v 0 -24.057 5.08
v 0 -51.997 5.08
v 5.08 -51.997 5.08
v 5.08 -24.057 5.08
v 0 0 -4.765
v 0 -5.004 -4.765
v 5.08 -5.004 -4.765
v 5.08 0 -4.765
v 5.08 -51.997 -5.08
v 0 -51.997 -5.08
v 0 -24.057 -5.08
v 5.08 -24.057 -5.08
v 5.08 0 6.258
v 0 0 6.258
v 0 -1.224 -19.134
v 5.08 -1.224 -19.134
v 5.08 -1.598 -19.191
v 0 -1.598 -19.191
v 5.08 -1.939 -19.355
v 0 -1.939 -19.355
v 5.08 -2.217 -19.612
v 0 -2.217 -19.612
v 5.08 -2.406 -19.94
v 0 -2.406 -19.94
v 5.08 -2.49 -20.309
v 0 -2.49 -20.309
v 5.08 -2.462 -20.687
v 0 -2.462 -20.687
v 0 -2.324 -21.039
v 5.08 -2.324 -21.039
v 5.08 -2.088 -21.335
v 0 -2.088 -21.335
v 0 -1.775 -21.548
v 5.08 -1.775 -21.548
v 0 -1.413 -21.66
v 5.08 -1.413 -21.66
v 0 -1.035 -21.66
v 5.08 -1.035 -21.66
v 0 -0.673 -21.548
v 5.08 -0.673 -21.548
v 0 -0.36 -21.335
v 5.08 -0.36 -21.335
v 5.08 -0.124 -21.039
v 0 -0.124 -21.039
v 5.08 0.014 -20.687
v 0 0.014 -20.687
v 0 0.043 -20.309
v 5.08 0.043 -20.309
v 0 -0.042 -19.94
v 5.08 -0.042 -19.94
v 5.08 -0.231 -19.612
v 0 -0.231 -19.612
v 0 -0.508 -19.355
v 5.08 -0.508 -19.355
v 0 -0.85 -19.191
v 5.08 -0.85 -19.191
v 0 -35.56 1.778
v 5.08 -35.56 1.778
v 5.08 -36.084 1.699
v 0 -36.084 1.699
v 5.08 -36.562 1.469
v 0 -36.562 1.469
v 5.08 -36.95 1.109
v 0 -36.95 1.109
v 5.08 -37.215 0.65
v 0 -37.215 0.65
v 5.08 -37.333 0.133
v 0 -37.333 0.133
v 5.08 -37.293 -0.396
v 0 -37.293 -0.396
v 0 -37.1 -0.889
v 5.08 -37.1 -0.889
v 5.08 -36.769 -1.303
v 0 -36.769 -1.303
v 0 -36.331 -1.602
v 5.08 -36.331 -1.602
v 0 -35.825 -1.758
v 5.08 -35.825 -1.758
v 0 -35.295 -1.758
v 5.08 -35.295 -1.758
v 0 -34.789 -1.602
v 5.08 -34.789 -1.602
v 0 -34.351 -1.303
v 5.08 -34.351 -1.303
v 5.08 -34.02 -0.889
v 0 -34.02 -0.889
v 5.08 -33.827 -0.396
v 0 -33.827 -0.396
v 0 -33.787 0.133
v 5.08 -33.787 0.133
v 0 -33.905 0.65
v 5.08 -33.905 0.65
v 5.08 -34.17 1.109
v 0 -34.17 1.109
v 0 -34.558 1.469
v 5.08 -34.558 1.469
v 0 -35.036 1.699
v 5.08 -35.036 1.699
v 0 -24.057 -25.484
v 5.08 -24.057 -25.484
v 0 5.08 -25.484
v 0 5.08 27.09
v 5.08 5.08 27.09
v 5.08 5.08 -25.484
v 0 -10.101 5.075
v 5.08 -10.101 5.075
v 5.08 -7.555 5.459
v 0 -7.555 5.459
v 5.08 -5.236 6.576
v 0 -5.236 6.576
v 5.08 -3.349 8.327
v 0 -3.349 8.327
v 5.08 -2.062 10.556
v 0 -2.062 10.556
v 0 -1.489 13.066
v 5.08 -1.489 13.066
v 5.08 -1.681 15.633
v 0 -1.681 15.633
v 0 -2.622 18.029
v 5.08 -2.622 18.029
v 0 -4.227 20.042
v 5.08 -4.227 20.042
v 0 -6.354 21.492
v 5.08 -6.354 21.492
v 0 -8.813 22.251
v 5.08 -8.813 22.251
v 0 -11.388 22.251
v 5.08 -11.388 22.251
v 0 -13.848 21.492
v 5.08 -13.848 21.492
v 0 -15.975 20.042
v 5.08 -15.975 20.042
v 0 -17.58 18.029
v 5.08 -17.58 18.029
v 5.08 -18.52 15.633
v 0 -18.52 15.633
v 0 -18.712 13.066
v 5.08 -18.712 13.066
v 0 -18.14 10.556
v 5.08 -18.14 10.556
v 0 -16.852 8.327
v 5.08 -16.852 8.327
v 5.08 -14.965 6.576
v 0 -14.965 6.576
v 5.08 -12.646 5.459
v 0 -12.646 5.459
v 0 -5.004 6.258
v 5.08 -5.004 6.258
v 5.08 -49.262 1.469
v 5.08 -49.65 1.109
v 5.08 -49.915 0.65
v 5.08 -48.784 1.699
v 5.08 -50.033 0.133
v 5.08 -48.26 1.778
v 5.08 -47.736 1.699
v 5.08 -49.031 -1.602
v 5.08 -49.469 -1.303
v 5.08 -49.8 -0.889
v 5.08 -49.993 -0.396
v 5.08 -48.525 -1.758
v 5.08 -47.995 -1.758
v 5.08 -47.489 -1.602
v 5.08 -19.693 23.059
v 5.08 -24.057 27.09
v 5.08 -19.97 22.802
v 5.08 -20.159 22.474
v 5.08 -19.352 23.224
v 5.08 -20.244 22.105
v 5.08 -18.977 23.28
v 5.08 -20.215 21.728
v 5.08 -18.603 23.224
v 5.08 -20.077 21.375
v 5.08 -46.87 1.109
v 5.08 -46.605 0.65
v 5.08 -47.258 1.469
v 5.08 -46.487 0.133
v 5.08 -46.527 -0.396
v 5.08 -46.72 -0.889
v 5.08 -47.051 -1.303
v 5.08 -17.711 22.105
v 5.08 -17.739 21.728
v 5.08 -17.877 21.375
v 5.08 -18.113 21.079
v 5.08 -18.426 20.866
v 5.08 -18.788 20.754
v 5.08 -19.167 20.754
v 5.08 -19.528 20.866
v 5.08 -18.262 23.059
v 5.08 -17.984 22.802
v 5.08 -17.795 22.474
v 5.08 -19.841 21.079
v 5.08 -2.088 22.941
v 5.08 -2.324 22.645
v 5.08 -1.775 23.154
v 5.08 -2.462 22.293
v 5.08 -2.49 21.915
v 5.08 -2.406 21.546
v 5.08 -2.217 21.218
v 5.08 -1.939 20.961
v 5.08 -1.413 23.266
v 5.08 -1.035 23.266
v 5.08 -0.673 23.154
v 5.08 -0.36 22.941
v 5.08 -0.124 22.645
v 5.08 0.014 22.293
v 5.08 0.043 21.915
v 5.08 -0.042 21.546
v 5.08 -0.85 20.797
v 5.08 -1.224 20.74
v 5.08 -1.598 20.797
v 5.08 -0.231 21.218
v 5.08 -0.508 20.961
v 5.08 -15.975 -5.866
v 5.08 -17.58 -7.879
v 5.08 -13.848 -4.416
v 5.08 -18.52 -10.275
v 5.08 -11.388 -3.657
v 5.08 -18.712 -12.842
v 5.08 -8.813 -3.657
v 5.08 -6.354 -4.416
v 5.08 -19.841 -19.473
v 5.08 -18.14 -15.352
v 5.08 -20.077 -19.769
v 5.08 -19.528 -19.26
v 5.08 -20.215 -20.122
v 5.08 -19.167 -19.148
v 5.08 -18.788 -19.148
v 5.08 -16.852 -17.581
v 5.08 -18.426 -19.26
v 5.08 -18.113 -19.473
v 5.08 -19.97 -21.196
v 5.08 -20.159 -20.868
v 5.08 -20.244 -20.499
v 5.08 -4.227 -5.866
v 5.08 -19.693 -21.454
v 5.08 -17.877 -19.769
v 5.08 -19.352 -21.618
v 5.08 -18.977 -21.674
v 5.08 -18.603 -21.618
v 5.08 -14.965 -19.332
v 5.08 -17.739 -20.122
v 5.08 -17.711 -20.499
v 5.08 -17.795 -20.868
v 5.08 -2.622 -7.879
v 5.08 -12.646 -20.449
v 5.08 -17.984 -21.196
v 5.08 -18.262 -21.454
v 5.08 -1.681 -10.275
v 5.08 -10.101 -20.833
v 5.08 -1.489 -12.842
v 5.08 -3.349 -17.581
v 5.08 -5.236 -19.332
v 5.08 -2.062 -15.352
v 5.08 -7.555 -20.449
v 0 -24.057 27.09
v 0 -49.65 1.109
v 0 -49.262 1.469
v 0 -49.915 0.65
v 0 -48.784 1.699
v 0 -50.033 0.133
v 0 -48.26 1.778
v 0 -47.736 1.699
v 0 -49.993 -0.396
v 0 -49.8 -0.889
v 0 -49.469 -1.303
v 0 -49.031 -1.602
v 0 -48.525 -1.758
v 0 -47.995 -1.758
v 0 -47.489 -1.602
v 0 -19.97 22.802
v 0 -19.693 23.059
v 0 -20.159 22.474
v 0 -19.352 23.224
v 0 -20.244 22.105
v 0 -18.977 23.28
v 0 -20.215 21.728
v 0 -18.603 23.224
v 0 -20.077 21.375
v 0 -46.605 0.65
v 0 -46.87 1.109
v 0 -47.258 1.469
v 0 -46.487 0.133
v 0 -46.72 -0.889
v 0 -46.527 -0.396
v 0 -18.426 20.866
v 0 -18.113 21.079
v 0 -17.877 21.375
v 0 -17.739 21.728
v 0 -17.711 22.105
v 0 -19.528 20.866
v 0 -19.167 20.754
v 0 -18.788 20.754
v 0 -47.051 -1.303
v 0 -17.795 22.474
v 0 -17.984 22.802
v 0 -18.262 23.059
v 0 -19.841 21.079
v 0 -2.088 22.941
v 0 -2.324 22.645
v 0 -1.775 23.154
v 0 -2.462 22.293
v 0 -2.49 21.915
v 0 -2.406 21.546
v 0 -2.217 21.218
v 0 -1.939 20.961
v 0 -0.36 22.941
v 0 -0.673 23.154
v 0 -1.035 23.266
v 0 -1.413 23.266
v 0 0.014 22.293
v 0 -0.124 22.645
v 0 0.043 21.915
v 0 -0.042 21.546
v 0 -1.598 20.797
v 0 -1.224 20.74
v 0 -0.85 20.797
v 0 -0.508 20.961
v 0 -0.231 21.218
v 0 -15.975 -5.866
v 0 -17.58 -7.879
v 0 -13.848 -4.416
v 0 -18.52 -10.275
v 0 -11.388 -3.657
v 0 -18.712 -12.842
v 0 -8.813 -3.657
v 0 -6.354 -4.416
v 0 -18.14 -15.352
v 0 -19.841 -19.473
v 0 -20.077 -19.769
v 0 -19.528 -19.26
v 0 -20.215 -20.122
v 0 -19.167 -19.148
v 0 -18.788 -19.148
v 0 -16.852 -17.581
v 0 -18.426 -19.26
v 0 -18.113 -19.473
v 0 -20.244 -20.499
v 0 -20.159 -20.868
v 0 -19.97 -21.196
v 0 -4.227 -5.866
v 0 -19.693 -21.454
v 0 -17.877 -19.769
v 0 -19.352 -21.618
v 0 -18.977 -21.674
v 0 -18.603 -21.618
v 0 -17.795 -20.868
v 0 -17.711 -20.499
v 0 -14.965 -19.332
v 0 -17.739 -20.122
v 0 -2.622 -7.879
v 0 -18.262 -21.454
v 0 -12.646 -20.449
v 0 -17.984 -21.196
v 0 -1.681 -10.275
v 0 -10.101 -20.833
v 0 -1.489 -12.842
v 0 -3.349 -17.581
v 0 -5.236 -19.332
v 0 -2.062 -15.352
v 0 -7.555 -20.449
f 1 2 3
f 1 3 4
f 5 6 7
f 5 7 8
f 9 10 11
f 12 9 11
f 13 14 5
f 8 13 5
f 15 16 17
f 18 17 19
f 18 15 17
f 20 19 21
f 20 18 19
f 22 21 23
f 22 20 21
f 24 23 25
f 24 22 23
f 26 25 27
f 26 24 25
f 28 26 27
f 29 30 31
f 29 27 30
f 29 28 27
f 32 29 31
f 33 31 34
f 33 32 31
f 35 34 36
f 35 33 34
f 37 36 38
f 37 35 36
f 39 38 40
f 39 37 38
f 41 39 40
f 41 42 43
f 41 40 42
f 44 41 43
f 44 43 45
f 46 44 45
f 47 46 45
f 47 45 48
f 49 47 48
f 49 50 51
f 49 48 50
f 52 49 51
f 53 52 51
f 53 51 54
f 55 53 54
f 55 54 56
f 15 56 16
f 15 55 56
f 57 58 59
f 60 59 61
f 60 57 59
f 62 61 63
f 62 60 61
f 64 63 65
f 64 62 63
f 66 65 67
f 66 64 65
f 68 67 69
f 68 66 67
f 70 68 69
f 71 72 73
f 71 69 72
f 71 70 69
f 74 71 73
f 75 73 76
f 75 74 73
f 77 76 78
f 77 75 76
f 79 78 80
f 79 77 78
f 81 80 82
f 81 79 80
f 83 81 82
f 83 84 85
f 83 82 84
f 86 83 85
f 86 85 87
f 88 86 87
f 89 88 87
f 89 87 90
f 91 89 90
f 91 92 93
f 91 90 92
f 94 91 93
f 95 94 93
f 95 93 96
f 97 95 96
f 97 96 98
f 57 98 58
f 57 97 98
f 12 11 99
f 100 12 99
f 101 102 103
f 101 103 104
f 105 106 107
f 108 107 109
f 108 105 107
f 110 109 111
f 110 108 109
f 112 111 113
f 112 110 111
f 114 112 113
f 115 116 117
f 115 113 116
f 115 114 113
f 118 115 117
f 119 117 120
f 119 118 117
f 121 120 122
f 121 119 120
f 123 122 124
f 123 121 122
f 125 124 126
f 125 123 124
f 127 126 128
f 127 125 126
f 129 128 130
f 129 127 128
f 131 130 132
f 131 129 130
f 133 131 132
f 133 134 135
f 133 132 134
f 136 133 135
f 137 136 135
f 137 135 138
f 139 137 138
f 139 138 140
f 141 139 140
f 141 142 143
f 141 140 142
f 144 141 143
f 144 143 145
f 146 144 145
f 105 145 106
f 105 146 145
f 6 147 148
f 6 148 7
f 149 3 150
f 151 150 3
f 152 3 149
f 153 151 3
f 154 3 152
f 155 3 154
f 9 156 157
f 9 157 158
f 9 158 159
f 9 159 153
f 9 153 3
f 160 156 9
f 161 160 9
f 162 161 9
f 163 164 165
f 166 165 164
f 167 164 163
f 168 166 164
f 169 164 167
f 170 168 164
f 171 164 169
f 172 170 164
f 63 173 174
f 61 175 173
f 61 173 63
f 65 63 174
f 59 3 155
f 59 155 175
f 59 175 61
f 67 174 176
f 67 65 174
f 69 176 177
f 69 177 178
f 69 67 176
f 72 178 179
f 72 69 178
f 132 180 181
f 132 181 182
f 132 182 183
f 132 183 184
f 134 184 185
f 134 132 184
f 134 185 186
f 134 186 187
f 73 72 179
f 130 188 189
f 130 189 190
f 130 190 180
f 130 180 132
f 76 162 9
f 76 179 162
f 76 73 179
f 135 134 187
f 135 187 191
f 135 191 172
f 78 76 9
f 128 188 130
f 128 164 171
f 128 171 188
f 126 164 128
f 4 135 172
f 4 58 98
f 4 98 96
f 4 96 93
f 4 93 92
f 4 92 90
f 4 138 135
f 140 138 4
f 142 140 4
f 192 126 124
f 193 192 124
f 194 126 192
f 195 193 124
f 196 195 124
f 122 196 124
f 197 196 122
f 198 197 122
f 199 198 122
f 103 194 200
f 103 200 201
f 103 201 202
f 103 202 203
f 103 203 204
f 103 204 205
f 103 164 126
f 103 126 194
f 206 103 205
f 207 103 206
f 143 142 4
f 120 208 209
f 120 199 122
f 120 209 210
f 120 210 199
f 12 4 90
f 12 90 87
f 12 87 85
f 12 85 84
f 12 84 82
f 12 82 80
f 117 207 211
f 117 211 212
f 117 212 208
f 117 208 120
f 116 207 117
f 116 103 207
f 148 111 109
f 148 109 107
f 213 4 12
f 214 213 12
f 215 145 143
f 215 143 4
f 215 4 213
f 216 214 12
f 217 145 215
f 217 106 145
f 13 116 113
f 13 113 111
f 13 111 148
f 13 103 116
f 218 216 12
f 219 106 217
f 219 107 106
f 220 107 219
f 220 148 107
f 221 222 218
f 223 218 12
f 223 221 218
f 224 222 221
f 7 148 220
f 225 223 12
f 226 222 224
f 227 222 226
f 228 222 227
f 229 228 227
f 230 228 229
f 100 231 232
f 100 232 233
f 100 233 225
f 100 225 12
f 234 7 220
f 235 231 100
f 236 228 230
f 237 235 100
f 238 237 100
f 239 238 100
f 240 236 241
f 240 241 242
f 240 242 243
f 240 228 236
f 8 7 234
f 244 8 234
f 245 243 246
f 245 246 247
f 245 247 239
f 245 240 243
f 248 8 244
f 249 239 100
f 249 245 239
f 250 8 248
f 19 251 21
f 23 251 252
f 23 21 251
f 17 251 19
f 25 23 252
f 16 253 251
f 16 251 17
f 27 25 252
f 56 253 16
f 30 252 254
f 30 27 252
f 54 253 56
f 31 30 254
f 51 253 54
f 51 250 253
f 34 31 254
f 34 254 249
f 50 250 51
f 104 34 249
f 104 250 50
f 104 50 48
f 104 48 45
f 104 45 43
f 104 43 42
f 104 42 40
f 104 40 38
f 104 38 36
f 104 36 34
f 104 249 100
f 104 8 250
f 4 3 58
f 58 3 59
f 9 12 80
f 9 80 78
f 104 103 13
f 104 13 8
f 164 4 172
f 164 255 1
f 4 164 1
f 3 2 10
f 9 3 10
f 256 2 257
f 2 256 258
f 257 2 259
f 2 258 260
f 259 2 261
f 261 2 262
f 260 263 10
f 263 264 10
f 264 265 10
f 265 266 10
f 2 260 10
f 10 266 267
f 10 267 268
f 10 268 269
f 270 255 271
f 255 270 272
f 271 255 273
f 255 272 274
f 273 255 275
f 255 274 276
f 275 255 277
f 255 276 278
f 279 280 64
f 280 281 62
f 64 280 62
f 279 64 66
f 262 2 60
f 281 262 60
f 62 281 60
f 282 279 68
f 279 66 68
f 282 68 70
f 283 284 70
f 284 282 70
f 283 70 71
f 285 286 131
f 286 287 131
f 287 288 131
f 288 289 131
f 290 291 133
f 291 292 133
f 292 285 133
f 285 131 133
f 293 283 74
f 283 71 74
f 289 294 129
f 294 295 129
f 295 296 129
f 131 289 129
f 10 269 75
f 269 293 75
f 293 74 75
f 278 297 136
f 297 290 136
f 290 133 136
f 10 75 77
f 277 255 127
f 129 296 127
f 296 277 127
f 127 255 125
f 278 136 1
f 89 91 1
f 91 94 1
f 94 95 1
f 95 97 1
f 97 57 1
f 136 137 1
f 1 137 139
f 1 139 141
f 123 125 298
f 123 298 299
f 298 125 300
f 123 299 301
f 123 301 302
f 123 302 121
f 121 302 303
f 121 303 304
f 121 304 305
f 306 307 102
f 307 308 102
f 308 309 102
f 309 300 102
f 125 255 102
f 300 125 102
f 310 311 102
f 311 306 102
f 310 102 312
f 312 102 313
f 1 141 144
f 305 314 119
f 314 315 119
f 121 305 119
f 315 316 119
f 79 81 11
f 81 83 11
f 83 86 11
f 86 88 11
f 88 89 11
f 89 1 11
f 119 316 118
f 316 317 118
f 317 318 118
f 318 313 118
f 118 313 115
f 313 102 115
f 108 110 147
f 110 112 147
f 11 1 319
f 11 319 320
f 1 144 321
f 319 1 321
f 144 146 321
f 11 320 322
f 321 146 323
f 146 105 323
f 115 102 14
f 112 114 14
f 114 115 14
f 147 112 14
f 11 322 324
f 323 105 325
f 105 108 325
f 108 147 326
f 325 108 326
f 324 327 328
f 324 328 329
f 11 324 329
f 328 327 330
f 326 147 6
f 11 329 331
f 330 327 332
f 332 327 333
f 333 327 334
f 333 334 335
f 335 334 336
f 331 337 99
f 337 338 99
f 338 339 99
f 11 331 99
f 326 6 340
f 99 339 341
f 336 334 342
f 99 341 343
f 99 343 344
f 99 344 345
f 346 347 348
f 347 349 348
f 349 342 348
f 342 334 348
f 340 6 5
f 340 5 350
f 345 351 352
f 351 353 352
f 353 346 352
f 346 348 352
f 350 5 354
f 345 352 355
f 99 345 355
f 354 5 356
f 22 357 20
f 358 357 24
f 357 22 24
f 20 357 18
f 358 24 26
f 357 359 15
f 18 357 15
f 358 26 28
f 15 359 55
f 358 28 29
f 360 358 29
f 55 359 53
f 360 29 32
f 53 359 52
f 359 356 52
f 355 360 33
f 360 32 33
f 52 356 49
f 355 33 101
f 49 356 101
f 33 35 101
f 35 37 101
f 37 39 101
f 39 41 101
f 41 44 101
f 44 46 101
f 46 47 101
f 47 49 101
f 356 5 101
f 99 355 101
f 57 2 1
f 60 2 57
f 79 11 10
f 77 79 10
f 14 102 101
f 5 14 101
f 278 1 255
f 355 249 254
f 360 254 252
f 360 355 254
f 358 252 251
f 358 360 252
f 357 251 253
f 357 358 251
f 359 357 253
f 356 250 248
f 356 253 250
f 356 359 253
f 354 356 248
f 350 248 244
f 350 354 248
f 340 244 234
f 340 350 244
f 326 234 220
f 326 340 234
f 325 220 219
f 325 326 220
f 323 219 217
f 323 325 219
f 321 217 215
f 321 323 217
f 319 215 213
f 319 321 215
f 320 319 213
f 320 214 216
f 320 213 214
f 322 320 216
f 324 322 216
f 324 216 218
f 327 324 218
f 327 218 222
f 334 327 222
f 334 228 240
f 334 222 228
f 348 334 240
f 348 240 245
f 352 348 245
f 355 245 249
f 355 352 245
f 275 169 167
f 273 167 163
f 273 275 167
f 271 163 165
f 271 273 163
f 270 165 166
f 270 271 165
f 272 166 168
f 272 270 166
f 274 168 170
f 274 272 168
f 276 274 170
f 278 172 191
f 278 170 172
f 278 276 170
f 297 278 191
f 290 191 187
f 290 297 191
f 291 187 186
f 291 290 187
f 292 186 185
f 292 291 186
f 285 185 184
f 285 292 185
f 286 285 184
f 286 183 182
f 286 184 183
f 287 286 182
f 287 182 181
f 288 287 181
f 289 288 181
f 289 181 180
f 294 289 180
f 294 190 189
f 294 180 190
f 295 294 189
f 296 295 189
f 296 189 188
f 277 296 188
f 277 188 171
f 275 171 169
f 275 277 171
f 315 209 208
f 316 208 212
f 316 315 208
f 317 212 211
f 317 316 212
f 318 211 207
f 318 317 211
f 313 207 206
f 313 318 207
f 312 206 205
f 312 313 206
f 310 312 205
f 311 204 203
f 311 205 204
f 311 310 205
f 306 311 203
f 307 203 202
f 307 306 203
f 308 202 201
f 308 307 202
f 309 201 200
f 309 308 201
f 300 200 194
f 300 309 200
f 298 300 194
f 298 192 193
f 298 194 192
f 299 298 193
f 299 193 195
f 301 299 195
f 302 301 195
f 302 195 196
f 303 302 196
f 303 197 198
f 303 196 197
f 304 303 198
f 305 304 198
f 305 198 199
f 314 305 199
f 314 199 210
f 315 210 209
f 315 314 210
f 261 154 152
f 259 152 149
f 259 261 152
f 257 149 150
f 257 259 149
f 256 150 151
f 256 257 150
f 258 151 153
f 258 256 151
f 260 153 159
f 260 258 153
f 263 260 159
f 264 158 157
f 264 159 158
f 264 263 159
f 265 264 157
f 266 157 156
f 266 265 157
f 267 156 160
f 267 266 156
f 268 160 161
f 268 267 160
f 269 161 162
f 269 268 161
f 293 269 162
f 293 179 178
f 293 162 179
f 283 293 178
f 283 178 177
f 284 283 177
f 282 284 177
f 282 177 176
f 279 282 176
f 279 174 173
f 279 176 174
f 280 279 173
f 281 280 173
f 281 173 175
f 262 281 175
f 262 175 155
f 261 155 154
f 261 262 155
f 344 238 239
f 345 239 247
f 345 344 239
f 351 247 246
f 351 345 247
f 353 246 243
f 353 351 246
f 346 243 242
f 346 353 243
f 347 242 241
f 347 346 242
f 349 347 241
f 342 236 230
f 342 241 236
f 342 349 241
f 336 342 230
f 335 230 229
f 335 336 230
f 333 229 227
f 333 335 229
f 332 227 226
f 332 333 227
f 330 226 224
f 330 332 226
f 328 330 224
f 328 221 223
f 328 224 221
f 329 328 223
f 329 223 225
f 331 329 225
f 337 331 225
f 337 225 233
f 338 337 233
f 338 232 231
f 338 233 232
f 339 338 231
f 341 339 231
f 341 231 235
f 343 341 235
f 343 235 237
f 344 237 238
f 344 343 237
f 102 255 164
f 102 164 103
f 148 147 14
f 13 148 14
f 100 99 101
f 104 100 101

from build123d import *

# Parameters (mm, degrees)
BOSS_EXTRUDE1_DEPTH = 5.08
SKETCH2_W           = 101.6
SKETCH2_H           = 10.16
CUT_EXTRUDE3_DEPTH  = 22.86
SKETCH9_R           = 1.27
CUT_EXTRUDE4_DEPTH  = 25.908
SKETCH13_W          = 11.0236
SKETCH13_H          = 5.0038
CUT_EXTRUDE5_DEPTH  = 25.908
SKETCH8_R           = 8.636
CUT_EXTRUDE6_DEPTH  = 25.908
SKETCH14_W          = 212.203069611
SKETCH14_H          = 122.52066239
SKETCH14_W_2        = 52.5744
SKETCH14_H_2        = 29.137232508
CUT_EXTRUDE7_DEPTH  = 25.908
SKETCH15_W          = 52.5744
SKETCH15_H          = 43.722211583
BOSS_EXTRUDE2_DEPTH = 5.08
SKETCH17_W          = 25.579382718
SKETCH17_H          = 36.902767492
CUT_EXTRUDE8_DEPTH  = 10.16
SKETCH18_R          = 1.7526
CUT_EXTRUDE9_DEPTH  = 10.16
SKETCH19_W          = 77.987144431
SKETCH19_H          = 16.36926668
CUT_EXTRUDE10_DEPTH = 19.05
SKETCH20_R          = 1.778
CUT_EXTRUDE11_DEPTH = 19.05


with BuildPart() as part:
    # Sketch1 → Boss-Extrude1 (new body)
    with BuildSketch(Plane(origin=(0, 0, 0), x_dir=(0, 0, -1), z_dir=(1, 0, 0))):
        Polygon((62.997029703, -55.82970297), (88.397029703, -55.82970297), (88.397029703, -65.98970297), (-89.402970297, -65.98970297), (-89.402970297, -55.82970297), (-64.002970297, -55.82970297), (-64.002970297, 27.837475742), (62.997029703, 27.837475742), align=None)
    extrude(amount=BOSS_EXTRUDE1_DEPTH)

    # Sketch2 → Cut-Extrude3 (cut)
    with BuildSketch(Plane(origin=(0, 0, 0), x_dir=(0, 0, -1), z_dir=(1, 0, 0))):
        with Locations((-0.502970297, -60.90970297)):
            Rectangle(SKETCH2_W, SKETCH2_H)
    extrude(amount=CUT_EXTRUDE3_DEPTH, mode=Mode.SUBTRACT)

    # Sketch9 → Cut-Extrude4 (cut)
    with BuildSketch(Plane(origin=(0, 0, 0), x_dir=(0, 0, -1), z_dir=(1, 0, 0))):
        with Locations((-22.010170297, -1.223907747)):
            Circle(SKETCH9_R)
        with Locations(Location((-22.010170297, -18.977232508, 0), (0, 0, 180))):
            Circle(SKETCH9_R)
        with Locations((20.404229703, -18.977232508)):
            Circle(SKETCH9_R)
        with Locations(Location((20.404229703, -1.223907747, 0), (0, 0, 180))):
            Circle(SKETCH9_R)
    extrude(amount=CUT_EXTRUDE4_DEPTH, mode=Mode.SUBTRACT)

    # Sketch13 → Cut-Extrude5 (cut)
    with BuildSketch(Plane(origin=(0, 0, 0), x_dir=(0, 0, -1), z_dir=(1, 0, 0))):
        with Locations((-0.746414126, -2.5019)):
            Rectangle(SKETCH13_W, SKETCH13_H)
    extrude(amount=CUT_EXTRUDE5_DEPTH, mode=Mode.SUBTRACT)

    # Sketch8 → Cut-Extrude6 (cut)
    with BuildSketch(Plane(origin=(0, 0, 0), x_dir=(0, 0, -1), z_dir=(1, 0, 0))):
        with Locations((12.197029703, -10.100570128)):
            Circle(SKETCH8_R)
        with Locations((-13.710970297, -10.100570128)):
            Circle(SKETCH8_R)
    extrude(amount=CUT_EXTRUDE6_DEPTH, mode=Mode.SUBTRACT)

    # Sketch14 → Cut-Extrude7 (cut)
    with BuildSketch(Plane(origin=(0, 0, 0), x_dir=(0, 0, -1), z_dir=(1, 0, 0))):
        with Locations((-5.581398167, -16.698007888)):
            Rectangle(SKETCH14_W, SKETCH14_H)
        with Locations((-0.802970297, -9.488616254)):
            Rectangle(SKETCH14_W_2, SKETCH14_H_2, mode=Mode.SUBTRACT)
    extrude(amount=CUT_EXTRUDE7_DEPTH, mode=Mode.SUBTRACT)

    # Sketch15 → Boss-Extrude2 (add)
    with BuildSketch(Plane(origin=(0, 0, 0), x_dir=(0, 0, -1), z_dir=(1, 0, 0))):
        with Locations((-0.802970297, -44.178894209)):
            Rectangle(SKETCH15_W, SKETCH15_H)
    extrude(amount=BOSS_EXTRUDE2_DEPTH)

    # Sketch17 → Cut-Extrude8 (cut)
    with BuildSketch(Plane(origin=(0, 0, 0), x_dir=(0, 0, -1), z_dir=(1, 0, 0))):
        with Locations((-17.869691359, -42.508616254)):
            Rectangle(SKETCH17_W, SKETCH17_H)
        with Locations((17.869691359, -42.508616254)):
            Rectangle(SKETCH17_W, SKETCH17_H)
    extrude(amount=CUT_EXTRUDE8_DEPTH, mode=Mode.SUBTRACT)

    # Sketch18 → Cut-Extrude9 (cut)
    with BuildSketch(Plane(origin=(0, -66.04, 0), x_dir=(1, 0, 0), z_dir=(0, 1, 0))):
        with Locations((0, -22.010170297)):
            Circle(SKETCH18_R)
        with Locations((0, 20.404229703)):
            Circle(SKETCH18_R)
    extrude(amount=CUT_EXTRUDE9_DEPTH, mode=Mode.SUBTRACT)

    # Sketch19 → Cut-Extrude10 (cut)
    with BuildSketch(Plane(origin=(0, 0, 0), x_dir=(0, 0, -1), z_dir=(1, 0, 0))):
        with Locations((-1.479514925, -60.181865848)):
            Rectangle(SKETCH19_W, SKETCH19_H)
    extrude(amount=CUT_EXTRUDE10_DEPTH, mode=Mode.SUBTRACT)

    # Sketch20 → Cut-Extrude11 (cut)
    with BuildSketch(Plane(origin=(0, 0, 0), x_dir=(0, 0, -1), z_dir=(1, 0, 0))):
        with Locations(Location((0, -48.26, 0), (0, 0, 180))):
            Circle(SKETCH20_R)
        with Locations(Location((0, -35.56, 0), (0, 0, 180))):
            Circle(SKETCH20_R)
    extrude(amount=CUT_EXTRUDE11_DEPTH, mode=Mode.SUBTRACT)


solid = part.part
